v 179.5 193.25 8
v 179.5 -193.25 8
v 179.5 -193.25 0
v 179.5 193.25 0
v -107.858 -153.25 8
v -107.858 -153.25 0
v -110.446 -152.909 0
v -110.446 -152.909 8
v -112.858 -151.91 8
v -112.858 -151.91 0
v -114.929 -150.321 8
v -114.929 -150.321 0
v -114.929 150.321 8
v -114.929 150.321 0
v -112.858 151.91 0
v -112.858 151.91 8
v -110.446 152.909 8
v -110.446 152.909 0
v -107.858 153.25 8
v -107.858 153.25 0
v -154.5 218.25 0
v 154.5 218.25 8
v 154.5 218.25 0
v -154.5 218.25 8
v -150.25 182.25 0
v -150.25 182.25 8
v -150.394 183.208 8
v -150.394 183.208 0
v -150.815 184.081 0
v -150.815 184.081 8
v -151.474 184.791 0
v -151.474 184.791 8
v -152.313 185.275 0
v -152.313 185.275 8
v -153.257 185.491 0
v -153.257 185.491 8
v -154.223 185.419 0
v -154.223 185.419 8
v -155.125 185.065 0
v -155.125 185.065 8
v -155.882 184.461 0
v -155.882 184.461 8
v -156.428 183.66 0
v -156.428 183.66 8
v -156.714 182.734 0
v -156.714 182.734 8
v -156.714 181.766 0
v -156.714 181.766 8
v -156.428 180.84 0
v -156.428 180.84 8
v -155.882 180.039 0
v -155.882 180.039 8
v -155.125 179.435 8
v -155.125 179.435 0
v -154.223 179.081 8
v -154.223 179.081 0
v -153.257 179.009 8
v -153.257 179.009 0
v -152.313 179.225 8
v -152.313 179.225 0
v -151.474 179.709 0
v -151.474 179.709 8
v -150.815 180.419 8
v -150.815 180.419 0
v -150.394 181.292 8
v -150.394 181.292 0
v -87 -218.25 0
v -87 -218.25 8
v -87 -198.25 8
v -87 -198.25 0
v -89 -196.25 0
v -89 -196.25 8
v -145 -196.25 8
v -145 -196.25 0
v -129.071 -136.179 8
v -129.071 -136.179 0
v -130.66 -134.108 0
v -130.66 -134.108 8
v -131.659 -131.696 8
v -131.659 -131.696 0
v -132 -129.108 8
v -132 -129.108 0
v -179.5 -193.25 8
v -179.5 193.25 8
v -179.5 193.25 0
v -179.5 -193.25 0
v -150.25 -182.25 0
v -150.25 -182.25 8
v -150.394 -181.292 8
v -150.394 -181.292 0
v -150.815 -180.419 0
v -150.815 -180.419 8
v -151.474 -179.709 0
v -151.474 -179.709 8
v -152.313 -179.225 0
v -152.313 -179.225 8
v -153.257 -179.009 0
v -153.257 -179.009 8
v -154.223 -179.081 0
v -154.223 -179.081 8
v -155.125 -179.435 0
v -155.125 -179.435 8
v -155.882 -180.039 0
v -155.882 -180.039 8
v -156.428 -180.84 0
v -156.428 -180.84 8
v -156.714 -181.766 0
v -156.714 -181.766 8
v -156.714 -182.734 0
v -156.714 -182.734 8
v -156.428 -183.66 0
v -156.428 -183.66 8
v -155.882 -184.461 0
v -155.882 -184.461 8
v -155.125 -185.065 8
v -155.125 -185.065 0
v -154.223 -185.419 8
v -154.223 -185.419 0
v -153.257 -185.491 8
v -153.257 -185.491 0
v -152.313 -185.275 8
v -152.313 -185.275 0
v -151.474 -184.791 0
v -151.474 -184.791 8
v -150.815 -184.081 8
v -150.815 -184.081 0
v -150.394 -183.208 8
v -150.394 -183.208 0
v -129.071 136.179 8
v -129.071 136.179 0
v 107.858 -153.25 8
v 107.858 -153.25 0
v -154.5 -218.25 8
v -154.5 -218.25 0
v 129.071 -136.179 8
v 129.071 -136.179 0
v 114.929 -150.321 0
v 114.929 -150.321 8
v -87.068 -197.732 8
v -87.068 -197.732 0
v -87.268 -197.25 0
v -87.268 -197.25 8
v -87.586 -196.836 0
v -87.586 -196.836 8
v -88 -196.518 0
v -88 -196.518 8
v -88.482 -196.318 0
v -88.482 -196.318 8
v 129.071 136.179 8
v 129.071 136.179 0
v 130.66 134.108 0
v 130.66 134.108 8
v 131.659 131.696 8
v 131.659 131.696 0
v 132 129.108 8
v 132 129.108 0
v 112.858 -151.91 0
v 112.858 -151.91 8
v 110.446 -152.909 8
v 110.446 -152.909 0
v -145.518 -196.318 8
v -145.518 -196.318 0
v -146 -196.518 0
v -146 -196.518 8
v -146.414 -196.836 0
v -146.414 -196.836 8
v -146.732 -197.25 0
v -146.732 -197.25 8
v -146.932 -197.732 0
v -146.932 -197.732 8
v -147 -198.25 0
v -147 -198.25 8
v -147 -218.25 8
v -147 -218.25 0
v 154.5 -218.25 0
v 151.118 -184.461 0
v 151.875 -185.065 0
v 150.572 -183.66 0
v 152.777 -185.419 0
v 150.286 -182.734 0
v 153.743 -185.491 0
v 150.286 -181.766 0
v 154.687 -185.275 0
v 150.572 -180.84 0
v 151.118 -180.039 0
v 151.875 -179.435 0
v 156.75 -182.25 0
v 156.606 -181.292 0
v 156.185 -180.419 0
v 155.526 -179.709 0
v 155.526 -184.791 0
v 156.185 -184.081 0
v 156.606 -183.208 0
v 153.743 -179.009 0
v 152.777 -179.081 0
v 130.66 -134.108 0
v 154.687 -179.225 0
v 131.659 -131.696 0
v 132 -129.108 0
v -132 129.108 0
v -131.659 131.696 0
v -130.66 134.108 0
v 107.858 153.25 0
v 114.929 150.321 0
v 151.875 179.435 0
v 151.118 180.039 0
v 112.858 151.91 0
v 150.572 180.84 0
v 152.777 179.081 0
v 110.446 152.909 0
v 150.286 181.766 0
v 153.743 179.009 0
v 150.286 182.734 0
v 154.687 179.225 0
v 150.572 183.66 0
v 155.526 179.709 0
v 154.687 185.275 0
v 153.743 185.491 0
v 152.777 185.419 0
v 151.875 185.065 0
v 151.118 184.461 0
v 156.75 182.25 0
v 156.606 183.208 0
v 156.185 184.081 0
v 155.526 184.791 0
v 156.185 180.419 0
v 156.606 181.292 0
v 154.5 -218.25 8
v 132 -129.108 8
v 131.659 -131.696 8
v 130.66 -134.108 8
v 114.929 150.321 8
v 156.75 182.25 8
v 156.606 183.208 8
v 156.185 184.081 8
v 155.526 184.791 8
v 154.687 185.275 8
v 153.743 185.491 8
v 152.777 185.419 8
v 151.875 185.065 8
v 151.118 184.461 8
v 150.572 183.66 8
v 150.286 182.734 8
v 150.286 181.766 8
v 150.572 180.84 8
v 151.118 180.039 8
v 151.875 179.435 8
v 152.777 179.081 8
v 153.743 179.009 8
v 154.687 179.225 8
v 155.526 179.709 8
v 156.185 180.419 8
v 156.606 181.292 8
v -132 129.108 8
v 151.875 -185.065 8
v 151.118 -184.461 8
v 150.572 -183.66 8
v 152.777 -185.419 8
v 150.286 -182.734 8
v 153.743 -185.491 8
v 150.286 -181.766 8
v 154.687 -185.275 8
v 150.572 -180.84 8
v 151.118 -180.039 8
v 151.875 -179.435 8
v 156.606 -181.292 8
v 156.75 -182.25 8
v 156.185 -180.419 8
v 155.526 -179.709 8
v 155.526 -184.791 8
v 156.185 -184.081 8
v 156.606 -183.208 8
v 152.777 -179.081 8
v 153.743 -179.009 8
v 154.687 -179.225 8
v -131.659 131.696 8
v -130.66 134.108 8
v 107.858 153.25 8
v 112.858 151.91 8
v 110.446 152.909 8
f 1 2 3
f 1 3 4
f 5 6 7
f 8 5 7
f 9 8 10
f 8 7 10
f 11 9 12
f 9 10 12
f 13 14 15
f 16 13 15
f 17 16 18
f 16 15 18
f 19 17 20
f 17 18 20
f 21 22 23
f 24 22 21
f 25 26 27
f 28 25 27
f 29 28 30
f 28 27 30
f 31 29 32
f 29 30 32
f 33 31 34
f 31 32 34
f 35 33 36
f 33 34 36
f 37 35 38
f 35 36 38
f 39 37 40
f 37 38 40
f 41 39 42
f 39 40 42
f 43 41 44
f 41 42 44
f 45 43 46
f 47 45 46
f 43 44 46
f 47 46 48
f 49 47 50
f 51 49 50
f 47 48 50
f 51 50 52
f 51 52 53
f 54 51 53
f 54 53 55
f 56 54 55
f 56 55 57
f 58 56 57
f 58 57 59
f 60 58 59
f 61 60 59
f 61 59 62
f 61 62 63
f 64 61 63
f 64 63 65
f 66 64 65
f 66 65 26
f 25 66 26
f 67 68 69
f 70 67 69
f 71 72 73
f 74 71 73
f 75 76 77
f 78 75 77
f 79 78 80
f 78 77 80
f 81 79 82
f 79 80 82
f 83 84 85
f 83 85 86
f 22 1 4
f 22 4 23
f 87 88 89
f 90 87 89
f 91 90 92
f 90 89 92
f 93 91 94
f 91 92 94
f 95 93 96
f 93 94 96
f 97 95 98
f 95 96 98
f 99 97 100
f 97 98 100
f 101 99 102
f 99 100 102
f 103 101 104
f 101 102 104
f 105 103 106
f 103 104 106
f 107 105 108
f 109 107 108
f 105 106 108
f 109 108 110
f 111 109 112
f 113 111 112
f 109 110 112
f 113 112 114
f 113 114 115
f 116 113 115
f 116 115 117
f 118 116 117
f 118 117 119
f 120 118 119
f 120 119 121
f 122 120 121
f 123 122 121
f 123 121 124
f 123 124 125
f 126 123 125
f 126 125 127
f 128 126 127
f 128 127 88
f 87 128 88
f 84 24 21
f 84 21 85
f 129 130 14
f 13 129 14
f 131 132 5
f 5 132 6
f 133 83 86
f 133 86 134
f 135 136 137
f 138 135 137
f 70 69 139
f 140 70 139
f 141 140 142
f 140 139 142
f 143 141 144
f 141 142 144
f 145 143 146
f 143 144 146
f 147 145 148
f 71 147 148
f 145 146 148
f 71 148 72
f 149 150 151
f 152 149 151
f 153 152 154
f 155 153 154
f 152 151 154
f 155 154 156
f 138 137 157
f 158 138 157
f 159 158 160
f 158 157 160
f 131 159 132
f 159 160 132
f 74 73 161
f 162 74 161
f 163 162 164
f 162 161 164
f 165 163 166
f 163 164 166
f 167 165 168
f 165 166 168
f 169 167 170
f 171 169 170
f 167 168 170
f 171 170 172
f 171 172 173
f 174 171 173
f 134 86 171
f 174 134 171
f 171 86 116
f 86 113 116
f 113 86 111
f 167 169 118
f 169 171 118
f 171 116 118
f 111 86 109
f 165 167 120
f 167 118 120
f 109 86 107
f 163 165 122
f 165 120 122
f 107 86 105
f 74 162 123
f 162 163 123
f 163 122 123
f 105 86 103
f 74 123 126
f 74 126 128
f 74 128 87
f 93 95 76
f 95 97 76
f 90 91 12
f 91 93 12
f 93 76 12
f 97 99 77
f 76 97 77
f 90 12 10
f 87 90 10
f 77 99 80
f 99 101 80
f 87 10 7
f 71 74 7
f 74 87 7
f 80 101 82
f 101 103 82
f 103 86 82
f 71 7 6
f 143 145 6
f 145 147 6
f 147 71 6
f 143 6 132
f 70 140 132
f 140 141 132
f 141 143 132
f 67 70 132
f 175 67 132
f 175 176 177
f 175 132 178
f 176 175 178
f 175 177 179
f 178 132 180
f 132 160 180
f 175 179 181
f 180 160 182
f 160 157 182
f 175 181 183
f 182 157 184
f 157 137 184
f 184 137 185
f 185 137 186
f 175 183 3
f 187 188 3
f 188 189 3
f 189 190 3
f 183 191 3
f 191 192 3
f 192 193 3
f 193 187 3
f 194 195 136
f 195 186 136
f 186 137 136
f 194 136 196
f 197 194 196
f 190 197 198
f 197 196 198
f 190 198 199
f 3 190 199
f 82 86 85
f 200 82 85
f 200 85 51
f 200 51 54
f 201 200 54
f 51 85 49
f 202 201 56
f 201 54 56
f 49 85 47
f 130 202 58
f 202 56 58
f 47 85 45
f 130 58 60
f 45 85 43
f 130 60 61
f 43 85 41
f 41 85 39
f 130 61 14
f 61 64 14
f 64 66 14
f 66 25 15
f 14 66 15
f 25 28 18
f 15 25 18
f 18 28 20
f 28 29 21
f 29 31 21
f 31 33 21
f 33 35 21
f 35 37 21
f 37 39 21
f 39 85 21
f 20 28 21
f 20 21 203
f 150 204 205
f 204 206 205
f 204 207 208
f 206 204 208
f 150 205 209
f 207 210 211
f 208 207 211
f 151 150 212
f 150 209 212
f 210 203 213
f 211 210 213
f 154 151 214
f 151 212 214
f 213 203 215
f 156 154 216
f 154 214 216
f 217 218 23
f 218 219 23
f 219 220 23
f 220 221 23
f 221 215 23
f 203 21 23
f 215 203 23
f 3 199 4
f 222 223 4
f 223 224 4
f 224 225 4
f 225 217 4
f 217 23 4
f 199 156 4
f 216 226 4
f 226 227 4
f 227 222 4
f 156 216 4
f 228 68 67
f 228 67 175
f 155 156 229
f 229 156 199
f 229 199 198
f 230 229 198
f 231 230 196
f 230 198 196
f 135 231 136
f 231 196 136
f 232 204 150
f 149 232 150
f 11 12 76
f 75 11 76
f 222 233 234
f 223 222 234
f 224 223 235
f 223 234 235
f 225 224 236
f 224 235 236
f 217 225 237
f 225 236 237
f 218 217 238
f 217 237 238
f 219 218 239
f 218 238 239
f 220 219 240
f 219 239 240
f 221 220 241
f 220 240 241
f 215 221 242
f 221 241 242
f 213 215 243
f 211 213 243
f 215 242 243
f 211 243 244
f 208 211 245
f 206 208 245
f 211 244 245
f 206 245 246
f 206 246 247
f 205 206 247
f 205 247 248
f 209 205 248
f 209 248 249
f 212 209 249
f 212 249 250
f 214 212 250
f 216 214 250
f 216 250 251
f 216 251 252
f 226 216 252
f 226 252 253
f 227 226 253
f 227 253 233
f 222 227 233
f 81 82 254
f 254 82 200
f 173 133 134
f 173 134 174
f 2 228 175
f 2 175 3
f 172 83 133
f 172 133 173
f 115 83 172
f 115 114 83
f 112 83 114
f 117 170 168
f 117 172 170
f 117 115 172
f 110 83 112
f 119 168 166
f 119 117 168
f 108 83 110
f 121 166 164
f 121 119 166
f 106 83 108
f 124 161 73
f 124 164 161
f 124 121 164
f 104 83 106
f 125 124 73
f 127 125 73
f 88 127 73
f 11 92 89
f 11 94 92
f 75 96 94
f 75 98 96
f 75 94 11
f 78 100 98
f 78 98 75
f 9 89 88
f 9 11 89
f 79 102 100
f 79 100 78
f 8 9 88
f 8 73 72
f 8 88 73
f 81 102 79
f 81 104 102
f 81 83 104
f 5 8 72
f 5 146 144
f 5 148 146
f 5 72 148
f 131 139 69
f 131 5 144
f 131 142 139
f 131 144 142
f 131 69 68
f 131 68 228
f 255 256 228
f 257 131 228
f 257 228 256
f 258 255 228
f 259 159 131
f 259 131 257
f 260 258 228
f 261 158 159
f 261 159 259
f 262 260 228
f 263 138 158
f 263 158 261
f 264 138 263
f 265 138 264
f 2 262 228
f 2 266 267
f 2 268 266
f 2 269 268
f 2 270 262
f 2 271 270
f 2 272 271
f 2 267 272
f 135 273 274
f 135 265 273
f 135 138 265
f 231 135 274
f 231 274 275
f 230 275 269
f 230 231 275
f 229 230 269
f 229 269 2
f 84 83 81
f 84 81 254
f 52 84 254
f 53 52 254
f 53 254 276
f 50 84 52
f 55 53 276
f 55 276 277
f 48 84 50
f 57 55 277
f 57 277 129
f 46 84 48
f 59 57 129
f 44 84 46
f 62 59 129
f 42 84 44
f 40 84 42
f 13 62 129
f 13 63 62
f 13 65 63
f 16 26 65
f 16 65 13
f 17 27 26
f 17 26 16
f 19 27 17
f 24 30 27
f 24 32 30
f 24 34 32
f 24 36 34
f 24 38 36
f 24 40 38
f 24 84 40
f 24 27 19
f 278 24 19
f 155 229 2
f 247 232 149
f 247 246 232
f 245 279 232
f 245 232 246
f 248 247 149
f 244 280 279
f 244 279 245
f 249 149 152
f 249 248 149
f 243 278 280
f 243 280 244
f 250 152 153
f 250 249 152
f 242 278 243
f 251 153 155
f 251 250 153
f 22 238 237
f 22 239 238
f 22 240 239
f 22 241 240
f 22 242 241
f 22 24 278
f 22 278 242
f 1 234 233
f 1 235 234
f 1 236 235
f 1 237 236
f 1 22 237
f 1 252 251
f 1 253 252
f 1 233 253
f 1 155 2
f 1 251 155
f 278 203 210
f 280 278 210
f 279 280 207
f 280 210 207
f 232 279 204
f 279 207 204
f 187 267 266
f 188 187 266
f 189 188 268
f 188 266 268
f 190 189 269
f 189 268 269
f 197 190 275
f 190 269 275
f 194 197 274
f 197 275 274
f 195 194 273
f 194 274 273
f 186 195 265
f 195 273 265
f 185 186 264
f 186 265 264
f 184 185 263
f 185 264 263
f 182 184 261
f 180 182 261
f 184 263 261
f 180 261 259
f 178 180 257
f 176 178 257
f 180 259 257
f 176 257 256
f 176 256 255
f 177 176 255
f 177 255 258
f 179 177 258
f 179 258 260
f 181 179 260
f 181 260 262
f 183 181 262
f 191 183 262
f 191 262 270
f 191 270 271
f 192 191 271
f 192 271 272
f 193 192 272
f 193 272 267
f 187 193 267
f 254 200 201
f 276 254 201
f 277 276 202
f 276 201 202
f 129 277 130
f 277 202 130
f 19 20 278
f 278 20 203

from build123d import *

# Parameters (mm, degrees)
BOSS_EXTRUDE1_DEPTH        = 8
CUT_EXTRUDE1_DEPTH         = 283.696502476
CUT_EXTRUDE2_DEPTH         = 283.696502476
F_6_5_6_5_DIAMETER_HOLE2_D = 6.5
CUT_EXTRUDE3_REACH         = 284.697


with BuildPart() as part:
    # Sketch1 → Boss-Extrude1 (new body)
    with BuildSketch(Plane.XY.offset(8)):
        Polygon((-154.499999959, -218.249999957), (154.500000044, -218.249999957), (179.500000086, -193.249999916), (179.500000086, 193.249999916), (154.500000044, 218.249999957), (-154.499999959, 218.249999957), (-179.5, 193.249999916), (-179.5, -193.249999916), align=None)
    extrude(amount=-BOSS_EXTRUDE1_DEPTH)

    # Sketch2 → Cut-Extrude1 (cut, through all)
    with BuildSketch(Plane(origin=(0, 0, 0), x_dir=(-1, 0, 0), z_dir=(0, 0, -1))):
        with BuildLine():
            Line((-107.857864329, -153.249999987), (107.857864423, -153.249999987))
            ThreePointArc((107.857864423, -153.249999987), (111.684698748, -152.488795312), (114.928932237, -150.321067798))
            Line((114.928932237, -150.321067798), (129.071067861, -136.178932174))
            ThreePointArc((129.071067861, -136.178932174), (131.23879537, -132.934698692), (132.000000044, -129.107864376))
            Line((132.000000044, -129.107864376), (132.000000044, 129.107864376))
            ThreePointArc((132.000000044, 129.107864376), (131.23879537, 132.934698692), (129.071067861, 136.178932174))
            Line((129.071067861, 136.178932174), (114.928932237, 150.321067798))
            ThreePointArc((114.928932237, 150.321067798), (111.684698748, 152.488795312), (107.857864423, 153.249999987))
            Line((107.857864423, 153.249999987), (-107.857864329, 153.249999987))
            ThreePointArc((-107.857864329, 153.249999987), (-111.684698653, 152.488795312), (-114.928932143, 150.321067798))
            Line((-114.928932143, 150.321067798), (-129.071067767, 136.178932174))
            ThreePointArc((-129.071067767, 136.178932174), (-131.238795276, 132.934698692), (-131.999999949, 129.107864376))
            Line((-131.999999949, 129.107864376), (-131.999999949, -129.107864376))
            ThreePointArc((-131.999999949, -129.107864376), (-131.238795276, -132.934698692), (-129.071067767, -136.178932174))
            Line((-129.071067767, -136.178932174), (-114.928932143, -150.321067798))
            ThreePointArc((-114.928932143, -150.321067798), (-111.684698653, -152.488795312), (-107.857864329, -153.249999987))
        make_face()
    extrude(amount=-CUT_EXTRUDE1_DEPTH, mode=Mode.SUBTRACT)

    # Sketch3 → Cut-Extrude2 (cut, through all)
    with BuildSketch(Plane(origin=(0, 0, 0), x_dir=(-1, 0, 0), z_dir=(0, 0, -1))):
        with BuildLine():
            Line((134.249999927, -198.50000003), (124.249999986, -198.50000003))
            ThreePointArc((124.249999986, -198.50000003), (122.835786445, -199.085786459), (122.250000016, -200.5))
            Line((122.250000016, -200.5), (122.250000016, -209.5))
            ThreePointArc((122.250000016, -209.5), (122.835786436, -210.91421352), (124.249999956, -211.49999994))
            Line((124.249999956, -211.49999994), (134.249999956, -211.49999994))
            ThreePointArc((134.249999956, -211.49999994), (135.664213457, -210.914213528), (136.249999869, -209.500000027))
            Line((136.249999869, -209.500000027), (136.249999869, -200.499999973))
            ThreePointArc((136.249999869, -200.499999973), (135.664213448, -199.085786451), (134.249999927, -198.50000003))
        make_face()
    extrude(amount=-CUT_EXTRUDE2_DEPTH, mode=Mode.SUBTRACT)

    # Ø6.5 (6.5) Diameter Hole2 (through all)
    with Locations(Plane(origin=(0, 0, 0), x_dir=(-1, 0, 0), z_dir=(0, 0, -1))):
        with Locations((-153.5, -182.25), (153.5, -182.25), (-153.5, 182.25), (153.5, 182.25)):
            Hole(F_6_5_6_5_DIAMETER_HOLE2_D / 2)

    # Sketch8 → Cut-Extrude3 (cut, up to next)
    with BuildSketch(Plane.XY.offset(8), mode=Mode.PRIVATE) as cut_extrude3_sk1:
        with BuildLine():
            Line((-89, -196.249999957), (-145, -196.249999957))
            ThreePointArc((-145, -196.249999957), (-146.414213562, -196.835786395), (-147, -198.249999957))
            Line((-147, -198.249999957), (-147, -218.249999957))
            Line((-147, -218.249999957), (-87, -218.249999957))
            Line((-87, -218.249999957), (-87, -198.249999957))
            ThreePointArc((-87, -198.249999957), (-87.585786438, -196.835786395), (-89, -196.249999957))
        make_face()
    cut_extrude3_tool1 = extrude(cut_extrude3_sk1.sketch, amount=-CUT_EXTRUDE3_REACH, mode=Mode.PRIVATE) & part.part
    add(cut_extrude3_tool1.solids().sort_by_distance((-117, -207.263744, 8))[0], mode=Mode.SUBTRACT)


solid = part.part
